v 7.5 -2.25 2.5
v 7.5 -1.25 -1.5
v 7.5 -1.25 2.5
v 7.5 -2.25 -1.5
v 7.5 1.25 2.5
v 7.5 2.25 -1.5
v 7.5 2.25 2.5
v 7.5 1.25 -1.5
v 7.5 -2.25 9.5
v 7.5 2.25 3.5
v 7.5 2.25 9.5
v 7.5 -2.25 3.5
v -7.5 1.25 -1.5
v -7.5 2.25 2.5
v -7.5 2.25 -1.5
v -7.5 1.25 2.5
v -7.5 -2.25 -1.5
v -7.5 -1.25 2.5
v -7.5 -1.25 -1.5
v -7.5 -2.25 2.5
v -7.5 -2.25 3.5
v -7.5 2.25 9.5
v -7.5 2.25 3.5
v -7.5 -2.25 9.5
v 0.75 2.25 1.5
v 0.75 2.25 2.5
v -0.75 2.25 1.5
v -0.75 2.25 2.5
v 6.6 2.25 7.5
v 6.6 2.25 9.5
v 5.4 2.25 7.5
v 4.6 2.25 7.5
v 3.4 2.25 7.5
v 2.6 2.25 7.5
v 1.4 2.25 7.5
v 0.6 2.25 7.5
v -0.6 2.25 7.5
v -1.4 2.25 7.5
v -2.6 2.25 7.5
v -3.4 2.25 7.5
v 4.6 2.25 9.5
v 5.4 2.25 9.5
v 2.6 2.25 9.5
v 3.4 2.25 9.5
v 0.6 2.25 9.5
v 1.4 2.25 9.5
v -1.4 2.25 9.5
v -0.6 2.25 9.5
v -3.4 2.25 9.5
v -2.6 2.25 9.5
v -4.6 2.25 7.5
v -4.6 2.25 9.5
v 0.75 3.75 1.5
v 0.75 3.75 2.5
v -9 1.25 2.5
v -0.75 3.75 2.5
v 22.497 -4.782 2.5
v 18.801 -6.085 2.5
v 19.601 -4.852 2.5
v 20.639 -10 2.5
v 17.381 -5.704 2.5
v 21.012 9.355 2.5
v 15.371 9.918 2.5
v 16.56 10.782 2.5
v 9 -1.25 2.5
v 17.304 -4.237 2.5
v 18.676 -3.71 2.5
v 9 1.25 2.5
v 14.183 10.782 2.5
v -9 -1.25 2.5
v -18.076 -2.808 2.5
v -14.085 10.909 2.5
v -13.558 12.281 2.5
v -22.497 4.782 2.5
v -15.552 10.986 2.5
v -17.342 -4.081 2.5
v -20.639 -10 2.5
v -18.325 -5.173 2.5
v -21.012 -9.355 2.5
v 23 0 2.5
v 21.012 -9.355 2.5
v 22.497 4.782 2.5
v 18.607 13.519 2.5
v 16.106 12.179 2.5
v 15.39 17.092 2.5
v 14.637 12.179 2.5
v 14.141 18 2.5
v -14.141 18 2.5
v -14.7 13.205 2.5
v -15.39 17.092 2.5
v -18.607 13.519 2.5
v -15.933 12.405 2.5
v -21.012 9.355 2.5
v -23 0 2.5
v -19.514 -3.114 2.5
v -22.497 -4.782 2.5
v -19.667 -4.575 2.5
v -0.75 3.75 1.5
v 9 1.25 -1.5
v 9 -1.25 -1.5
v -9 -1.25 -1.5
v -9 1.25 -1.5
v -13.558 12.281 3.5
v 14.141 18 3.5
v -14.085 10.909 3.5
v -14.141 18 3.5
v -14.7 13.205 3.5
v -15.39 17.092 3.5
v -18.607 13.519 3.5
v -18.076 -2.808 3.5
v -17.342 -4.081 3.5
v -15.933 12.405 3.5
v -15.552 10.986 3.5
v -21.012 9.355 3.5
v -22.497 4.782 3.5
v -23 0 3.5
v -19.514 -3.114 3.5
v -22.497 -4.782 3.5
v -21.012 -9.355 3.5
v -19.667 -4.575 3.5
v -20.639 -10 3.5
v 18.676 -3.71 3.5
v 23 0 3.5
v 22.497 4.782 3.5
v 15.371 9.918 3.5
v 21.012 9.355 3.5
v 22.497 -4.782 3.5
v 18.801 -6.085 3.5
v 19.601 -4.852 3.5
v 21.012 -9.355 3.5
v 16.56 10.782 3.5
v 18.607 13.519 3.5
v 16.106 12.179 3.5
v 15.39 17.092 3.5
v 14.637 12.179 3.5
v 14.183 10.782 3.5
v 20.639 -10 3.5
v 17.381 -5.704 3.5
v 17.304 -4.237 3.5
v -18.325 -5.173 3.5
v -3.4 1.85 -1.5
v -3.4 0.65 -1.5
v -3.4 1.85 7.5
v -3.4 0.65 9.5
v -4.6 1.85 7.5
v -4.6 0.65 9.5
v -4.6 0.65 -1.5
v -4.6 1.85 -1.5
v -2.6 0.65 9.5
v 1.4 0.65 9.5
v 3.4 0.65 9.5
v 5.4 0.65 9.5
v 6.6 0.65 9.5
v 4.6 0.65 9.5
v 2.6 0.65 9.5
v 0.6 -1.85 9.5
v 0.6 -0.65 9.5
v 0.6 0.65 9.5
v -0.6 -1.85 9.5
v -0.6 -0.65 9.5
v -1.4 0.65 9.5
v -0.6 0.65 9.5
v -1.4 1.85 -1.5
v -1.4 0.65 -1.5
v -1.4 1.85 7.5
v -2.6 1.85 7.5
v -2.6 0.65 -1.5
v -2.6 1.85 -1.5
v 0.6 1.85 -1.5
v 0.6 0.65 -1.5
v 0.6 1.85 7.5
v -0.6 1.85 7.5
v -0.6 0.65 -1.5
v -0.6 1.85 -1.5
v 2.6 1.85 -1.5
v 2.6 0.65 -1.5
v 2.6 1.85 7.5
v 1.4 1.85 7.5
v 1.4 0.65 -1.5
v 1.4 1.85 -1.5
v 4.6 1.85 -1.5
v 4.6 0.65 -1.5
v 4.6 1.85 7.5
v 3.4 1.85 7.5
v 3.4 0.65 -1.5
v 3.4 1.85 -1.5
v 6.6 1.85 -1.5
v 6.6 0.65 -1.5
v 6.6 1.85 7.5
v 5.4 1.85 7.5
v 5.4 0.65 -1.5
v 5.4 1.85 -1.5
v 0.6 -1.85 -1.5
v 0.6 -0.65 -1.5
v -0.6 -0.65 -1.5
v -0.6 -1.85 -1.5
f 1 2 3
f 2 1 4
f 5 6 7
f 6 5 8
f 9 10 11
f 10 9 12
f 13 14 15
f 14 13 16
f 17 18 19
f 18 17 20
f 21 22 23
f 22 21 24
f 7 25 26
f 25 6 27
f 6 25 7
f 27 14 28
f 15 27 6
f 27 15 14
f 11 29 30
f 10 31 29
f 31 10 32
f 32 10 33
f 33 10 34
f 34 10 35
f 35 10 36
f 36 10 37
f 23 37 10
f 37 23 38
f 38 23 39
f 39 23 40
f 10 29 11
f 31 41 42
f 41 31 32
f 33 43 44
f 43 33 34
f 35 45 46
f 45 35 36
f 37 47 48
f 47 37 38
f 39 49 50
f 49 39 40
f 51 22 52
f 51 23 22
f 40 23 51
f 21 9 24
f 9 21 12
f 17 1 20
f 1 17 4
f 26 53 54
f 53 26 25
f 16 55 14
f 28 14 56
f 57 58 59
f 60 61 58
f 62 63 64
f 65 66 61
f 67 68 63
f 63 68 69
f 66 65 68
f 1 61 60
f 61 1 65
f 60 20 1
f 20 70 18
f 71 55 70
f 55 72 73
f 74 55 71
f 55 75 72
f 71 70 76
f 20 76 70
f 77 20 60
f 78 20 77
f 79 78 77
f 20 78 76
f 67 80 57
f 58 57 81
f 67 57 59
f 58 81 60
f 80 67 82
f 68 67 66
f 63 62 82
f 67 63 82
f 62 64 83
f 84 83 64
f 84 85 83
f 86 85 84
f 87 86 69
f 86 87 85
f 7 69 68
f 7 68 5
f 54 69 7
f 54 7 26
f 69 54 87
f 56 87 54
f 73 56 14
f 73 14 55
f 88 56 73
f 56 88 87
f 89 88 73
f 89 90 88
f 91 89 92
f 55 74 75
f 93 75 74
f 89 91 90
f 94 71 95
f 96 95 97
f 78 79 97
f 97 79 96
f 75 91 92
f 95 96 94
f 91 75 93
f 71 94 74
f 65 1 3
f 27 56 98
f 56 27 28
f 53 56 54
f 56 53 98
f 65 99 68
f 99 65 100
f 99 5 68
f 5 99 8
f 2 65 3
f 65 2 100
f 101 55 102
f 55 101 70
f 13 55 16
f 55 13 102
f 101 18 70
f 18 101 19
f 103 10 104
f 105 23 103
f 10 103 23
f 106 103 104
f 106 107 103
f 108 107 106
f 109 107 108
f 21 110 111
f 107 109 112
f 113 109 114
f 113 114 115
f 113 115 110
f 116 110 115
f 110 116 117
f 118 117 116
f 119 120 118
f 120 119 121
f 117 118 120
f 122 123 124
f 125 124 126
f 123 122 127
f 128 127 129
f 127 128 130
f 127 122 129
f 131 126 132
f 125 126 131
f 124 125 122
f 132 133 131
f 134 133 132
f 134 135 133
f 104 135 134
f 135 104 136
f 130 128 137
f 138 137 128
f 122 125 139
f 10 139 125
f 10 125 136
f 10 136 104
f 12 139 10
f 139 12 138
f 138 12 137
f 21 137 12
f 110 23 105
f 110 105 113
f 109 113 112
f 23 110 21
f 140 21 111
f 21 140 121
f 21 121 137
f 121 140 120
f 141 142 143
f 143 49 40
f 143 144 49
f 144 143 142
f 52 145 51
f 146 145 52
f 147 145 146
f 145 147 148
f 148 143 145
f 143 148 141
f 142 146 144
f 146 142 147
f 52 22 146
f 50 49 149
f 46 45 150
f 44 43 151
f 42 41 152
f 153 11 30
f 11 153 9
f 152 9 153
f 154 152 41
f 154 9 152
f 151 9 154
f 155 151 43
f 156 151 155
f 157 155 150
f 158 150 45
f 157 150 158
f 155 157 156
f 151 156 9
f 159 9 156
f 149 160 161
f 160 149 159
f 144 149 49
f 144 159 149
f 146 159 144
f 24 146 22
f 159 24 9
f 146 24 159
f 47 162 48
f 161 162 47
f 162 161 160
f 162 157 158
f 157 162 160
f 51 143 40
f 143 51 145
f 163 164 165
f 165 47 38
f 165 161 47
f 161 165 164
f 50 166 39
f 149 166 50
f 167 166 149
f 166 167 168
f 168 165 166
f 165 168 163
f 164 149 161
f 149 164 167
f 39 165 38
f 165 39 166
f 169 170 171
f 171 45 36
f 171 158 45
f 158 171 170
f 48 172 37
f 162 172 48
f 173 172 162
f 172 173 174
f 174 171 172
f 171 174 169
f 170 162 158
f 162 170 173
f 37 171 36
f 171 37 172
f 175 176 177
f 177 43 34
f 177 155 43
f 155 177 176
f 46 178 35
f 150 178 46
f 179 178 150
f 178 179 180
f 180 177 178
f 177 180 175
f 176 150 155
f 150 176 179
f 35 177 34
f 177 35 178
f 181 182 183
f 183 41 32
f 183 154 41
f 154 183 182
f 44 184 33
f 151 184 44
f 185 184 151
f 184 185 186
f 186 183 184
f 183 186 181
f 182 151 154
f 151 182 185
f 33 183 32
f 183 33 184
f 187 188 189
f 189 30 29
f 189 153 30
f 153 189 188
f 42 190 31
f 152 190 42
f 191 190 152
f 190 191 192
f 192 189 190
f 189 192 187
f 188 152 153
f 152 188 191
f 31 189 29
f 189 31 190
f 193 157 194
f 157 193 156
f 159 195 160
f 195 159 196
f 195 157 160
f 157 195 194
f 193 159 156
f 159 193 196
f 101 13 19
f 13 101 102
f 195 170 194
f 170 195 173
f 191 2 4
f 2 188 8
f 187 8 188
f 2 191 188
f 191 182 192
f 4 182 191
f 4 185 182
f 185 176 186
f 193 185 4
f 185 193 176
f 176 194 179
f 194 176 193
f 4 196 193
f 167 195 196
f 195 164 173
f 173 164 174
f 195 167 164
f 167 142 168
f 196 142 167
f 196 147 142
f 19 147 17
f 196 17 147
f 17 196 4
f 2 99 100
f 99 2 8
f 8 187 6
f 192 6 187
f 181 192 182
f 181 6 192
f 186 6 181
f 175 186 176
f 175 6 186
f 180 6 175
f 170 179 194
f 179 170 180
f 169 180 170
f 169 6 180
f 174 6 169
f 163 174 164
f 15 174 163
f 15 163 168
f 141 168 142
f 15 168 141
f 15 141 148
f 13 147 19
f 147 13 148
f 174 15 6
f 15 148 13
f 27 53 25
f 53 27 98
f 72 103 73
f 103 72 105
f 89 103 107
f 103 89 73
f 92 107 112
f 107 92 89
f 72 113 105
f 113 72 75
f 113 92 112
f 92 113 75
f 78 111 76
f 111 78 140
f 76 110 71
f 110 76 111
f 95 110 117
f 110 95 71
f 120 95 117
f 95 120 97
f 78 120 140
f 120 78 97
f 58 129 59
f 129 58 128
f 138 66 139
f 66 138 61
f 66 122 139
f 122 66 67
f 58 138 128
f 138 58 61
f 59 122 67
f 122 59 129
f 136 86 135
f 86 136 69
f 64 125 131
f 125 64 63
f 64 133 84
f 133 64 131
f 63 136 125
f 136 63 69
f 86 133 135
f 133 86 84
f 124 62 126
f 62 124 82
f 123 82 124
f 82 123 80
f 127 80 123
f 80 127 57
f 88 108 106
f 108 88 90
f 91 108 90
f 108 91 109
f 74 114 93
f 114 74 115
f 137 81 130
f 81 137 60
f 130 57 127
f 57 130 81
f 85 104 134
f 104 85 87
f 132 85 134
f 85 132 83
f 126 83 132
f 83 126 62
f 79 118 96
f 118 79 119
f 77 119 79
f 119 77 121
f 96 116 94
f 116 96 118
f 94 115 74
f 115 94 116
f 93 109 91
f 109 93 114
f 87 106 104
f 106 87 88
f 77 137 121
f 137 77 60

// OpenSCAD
box_length = 15;
box_width = 4.5;
box_height = 6;
box_height_extra = 5;
pin_pad = 0.5;
pin_width = 1.2;
nop_width = 1.5;
nop_height = 1.5;

sidepin_width = 2.5;

module holebox(x = 0, y = 0, z = 0, withHoles = 1){
    translate([x,y,z+1.5]){
        difference(){
            translate([0,0,box_height_extra/2])
            cube([box_length, box_width, box_height+box_height_extra], center = true);
        
            if (withHoles != 0){
                for ( i = [-3 : 3]){
                    if (i != -3){
                        translate([i*2, box_width/2-1, 0])
                            cube([pin_width, pin_width, box_height+1+box_height_extra*2], center = true);
                        
                        //sideholes
                        translate([i*2-pin_width/2,box_width/2-1,box_height])
                            cube([pin_width,1,2]);
                    }
                    if (i == 0)
                    translate([i*2, -(box_width/2-1), 0])
                        cube([pin_width, pin_width, box_height+1+box_height_extra*2], center = true);
                }
            }
        }
        

        //pin
        translate([0, box_width/2 + nop_width/2, box_height/2-nop_height/2 - pin_pad-1])
            cube([nop_width, nop_width, nop_height], center = true);
        translate([0, box_width/2 + nop_width/2, box_height/2-nop_height/2-1])
            cube([nop_width, nop_width, nop_height], center = true);
        
        
        //sidepin right
        translate([box_length/2 + nop_width/2, 0, -0.5])
            cube([nop_width, sidepin_width, box_height-1], center = true);

        //sidepin left
        translate([-(box_length/2 + nop_width/2), 0, -0.5])
            cube([nop_width, sidepin_width, box_height-1], center = true);
        
    }
}

support_len = 2;
support_width = 4;
thickness = 1;
module foot(x = 0, y = 0, z = 0){
    
    leg_len = 4;
    
    translate([x-support_width/2,y-support_len/2,z]){
        translate([0,0,1])
            cube([support_width,2,1]);

/*        
        translate([0,0,-leg_len/2])
        rotate([-90,0,0])
        rotate([0,90,0])
        color("blue")
        cylinder(support_width,1,1,$fn=3);

        
        translate([0,-0.5,0])
        rotate([0,0,0]){
            translate([0,0,-leg_len+2])
                cube([support_width,thickness,leg_len]);                    
        }
*/
    }
}

module hole(x = 0, y = 0, z = 0){
    translate([x,y,z-1]){
        cylinder(3,1.25,1.25);
    }
}


module adapter(x = 0, y = 0, z = 0){
    plate_length = box_width + 8;
    plate_width = box_length + 8;
    plate_thickness = 1;
    
    plate_conn = 4;
    
    fplate_radius = 23;
    
    pull_cylinder_radius = 2;
    pull_cylinder_height = 10;
    
    translate([x,y,z]){
        difference(){
            translate([0,0,nop_height+plate_thickness+0.5])
                color("green")
                cube([plate_width, plate_length, plate_thickness], center = true);            
            translate([0,0,1])
                holebox(0,0,0,0);
        }
        color("red") 
        holebox(0,0,0);
        
        translate([0,0,nop_height+plate_thickness])
        difference(){
            cylinder(1, fplate_radius, fplate_radius);
            cube([plate_width-plate_conn, plate_length-plate_conn, plate_thickness+5], center = true);            

            for ( i = [1,2,5,6]){
                rotate([0,0,51*i + 180])
                    hole(0,-fplate_radius+4,0);
            }
            
            translate([-20,18,-1])
                cube([50,10,3]);
            translate([-30,-30,-1])
                cube([100,20,3]);
        }

/* 
        for ( i = [0:6]){
            rotate([0,0,51*i])
                foot(0,-fplate_radius,nop_height);            
        }
*/
    }
}


//holebox(0,0,0);

adapter(0,0,0);
